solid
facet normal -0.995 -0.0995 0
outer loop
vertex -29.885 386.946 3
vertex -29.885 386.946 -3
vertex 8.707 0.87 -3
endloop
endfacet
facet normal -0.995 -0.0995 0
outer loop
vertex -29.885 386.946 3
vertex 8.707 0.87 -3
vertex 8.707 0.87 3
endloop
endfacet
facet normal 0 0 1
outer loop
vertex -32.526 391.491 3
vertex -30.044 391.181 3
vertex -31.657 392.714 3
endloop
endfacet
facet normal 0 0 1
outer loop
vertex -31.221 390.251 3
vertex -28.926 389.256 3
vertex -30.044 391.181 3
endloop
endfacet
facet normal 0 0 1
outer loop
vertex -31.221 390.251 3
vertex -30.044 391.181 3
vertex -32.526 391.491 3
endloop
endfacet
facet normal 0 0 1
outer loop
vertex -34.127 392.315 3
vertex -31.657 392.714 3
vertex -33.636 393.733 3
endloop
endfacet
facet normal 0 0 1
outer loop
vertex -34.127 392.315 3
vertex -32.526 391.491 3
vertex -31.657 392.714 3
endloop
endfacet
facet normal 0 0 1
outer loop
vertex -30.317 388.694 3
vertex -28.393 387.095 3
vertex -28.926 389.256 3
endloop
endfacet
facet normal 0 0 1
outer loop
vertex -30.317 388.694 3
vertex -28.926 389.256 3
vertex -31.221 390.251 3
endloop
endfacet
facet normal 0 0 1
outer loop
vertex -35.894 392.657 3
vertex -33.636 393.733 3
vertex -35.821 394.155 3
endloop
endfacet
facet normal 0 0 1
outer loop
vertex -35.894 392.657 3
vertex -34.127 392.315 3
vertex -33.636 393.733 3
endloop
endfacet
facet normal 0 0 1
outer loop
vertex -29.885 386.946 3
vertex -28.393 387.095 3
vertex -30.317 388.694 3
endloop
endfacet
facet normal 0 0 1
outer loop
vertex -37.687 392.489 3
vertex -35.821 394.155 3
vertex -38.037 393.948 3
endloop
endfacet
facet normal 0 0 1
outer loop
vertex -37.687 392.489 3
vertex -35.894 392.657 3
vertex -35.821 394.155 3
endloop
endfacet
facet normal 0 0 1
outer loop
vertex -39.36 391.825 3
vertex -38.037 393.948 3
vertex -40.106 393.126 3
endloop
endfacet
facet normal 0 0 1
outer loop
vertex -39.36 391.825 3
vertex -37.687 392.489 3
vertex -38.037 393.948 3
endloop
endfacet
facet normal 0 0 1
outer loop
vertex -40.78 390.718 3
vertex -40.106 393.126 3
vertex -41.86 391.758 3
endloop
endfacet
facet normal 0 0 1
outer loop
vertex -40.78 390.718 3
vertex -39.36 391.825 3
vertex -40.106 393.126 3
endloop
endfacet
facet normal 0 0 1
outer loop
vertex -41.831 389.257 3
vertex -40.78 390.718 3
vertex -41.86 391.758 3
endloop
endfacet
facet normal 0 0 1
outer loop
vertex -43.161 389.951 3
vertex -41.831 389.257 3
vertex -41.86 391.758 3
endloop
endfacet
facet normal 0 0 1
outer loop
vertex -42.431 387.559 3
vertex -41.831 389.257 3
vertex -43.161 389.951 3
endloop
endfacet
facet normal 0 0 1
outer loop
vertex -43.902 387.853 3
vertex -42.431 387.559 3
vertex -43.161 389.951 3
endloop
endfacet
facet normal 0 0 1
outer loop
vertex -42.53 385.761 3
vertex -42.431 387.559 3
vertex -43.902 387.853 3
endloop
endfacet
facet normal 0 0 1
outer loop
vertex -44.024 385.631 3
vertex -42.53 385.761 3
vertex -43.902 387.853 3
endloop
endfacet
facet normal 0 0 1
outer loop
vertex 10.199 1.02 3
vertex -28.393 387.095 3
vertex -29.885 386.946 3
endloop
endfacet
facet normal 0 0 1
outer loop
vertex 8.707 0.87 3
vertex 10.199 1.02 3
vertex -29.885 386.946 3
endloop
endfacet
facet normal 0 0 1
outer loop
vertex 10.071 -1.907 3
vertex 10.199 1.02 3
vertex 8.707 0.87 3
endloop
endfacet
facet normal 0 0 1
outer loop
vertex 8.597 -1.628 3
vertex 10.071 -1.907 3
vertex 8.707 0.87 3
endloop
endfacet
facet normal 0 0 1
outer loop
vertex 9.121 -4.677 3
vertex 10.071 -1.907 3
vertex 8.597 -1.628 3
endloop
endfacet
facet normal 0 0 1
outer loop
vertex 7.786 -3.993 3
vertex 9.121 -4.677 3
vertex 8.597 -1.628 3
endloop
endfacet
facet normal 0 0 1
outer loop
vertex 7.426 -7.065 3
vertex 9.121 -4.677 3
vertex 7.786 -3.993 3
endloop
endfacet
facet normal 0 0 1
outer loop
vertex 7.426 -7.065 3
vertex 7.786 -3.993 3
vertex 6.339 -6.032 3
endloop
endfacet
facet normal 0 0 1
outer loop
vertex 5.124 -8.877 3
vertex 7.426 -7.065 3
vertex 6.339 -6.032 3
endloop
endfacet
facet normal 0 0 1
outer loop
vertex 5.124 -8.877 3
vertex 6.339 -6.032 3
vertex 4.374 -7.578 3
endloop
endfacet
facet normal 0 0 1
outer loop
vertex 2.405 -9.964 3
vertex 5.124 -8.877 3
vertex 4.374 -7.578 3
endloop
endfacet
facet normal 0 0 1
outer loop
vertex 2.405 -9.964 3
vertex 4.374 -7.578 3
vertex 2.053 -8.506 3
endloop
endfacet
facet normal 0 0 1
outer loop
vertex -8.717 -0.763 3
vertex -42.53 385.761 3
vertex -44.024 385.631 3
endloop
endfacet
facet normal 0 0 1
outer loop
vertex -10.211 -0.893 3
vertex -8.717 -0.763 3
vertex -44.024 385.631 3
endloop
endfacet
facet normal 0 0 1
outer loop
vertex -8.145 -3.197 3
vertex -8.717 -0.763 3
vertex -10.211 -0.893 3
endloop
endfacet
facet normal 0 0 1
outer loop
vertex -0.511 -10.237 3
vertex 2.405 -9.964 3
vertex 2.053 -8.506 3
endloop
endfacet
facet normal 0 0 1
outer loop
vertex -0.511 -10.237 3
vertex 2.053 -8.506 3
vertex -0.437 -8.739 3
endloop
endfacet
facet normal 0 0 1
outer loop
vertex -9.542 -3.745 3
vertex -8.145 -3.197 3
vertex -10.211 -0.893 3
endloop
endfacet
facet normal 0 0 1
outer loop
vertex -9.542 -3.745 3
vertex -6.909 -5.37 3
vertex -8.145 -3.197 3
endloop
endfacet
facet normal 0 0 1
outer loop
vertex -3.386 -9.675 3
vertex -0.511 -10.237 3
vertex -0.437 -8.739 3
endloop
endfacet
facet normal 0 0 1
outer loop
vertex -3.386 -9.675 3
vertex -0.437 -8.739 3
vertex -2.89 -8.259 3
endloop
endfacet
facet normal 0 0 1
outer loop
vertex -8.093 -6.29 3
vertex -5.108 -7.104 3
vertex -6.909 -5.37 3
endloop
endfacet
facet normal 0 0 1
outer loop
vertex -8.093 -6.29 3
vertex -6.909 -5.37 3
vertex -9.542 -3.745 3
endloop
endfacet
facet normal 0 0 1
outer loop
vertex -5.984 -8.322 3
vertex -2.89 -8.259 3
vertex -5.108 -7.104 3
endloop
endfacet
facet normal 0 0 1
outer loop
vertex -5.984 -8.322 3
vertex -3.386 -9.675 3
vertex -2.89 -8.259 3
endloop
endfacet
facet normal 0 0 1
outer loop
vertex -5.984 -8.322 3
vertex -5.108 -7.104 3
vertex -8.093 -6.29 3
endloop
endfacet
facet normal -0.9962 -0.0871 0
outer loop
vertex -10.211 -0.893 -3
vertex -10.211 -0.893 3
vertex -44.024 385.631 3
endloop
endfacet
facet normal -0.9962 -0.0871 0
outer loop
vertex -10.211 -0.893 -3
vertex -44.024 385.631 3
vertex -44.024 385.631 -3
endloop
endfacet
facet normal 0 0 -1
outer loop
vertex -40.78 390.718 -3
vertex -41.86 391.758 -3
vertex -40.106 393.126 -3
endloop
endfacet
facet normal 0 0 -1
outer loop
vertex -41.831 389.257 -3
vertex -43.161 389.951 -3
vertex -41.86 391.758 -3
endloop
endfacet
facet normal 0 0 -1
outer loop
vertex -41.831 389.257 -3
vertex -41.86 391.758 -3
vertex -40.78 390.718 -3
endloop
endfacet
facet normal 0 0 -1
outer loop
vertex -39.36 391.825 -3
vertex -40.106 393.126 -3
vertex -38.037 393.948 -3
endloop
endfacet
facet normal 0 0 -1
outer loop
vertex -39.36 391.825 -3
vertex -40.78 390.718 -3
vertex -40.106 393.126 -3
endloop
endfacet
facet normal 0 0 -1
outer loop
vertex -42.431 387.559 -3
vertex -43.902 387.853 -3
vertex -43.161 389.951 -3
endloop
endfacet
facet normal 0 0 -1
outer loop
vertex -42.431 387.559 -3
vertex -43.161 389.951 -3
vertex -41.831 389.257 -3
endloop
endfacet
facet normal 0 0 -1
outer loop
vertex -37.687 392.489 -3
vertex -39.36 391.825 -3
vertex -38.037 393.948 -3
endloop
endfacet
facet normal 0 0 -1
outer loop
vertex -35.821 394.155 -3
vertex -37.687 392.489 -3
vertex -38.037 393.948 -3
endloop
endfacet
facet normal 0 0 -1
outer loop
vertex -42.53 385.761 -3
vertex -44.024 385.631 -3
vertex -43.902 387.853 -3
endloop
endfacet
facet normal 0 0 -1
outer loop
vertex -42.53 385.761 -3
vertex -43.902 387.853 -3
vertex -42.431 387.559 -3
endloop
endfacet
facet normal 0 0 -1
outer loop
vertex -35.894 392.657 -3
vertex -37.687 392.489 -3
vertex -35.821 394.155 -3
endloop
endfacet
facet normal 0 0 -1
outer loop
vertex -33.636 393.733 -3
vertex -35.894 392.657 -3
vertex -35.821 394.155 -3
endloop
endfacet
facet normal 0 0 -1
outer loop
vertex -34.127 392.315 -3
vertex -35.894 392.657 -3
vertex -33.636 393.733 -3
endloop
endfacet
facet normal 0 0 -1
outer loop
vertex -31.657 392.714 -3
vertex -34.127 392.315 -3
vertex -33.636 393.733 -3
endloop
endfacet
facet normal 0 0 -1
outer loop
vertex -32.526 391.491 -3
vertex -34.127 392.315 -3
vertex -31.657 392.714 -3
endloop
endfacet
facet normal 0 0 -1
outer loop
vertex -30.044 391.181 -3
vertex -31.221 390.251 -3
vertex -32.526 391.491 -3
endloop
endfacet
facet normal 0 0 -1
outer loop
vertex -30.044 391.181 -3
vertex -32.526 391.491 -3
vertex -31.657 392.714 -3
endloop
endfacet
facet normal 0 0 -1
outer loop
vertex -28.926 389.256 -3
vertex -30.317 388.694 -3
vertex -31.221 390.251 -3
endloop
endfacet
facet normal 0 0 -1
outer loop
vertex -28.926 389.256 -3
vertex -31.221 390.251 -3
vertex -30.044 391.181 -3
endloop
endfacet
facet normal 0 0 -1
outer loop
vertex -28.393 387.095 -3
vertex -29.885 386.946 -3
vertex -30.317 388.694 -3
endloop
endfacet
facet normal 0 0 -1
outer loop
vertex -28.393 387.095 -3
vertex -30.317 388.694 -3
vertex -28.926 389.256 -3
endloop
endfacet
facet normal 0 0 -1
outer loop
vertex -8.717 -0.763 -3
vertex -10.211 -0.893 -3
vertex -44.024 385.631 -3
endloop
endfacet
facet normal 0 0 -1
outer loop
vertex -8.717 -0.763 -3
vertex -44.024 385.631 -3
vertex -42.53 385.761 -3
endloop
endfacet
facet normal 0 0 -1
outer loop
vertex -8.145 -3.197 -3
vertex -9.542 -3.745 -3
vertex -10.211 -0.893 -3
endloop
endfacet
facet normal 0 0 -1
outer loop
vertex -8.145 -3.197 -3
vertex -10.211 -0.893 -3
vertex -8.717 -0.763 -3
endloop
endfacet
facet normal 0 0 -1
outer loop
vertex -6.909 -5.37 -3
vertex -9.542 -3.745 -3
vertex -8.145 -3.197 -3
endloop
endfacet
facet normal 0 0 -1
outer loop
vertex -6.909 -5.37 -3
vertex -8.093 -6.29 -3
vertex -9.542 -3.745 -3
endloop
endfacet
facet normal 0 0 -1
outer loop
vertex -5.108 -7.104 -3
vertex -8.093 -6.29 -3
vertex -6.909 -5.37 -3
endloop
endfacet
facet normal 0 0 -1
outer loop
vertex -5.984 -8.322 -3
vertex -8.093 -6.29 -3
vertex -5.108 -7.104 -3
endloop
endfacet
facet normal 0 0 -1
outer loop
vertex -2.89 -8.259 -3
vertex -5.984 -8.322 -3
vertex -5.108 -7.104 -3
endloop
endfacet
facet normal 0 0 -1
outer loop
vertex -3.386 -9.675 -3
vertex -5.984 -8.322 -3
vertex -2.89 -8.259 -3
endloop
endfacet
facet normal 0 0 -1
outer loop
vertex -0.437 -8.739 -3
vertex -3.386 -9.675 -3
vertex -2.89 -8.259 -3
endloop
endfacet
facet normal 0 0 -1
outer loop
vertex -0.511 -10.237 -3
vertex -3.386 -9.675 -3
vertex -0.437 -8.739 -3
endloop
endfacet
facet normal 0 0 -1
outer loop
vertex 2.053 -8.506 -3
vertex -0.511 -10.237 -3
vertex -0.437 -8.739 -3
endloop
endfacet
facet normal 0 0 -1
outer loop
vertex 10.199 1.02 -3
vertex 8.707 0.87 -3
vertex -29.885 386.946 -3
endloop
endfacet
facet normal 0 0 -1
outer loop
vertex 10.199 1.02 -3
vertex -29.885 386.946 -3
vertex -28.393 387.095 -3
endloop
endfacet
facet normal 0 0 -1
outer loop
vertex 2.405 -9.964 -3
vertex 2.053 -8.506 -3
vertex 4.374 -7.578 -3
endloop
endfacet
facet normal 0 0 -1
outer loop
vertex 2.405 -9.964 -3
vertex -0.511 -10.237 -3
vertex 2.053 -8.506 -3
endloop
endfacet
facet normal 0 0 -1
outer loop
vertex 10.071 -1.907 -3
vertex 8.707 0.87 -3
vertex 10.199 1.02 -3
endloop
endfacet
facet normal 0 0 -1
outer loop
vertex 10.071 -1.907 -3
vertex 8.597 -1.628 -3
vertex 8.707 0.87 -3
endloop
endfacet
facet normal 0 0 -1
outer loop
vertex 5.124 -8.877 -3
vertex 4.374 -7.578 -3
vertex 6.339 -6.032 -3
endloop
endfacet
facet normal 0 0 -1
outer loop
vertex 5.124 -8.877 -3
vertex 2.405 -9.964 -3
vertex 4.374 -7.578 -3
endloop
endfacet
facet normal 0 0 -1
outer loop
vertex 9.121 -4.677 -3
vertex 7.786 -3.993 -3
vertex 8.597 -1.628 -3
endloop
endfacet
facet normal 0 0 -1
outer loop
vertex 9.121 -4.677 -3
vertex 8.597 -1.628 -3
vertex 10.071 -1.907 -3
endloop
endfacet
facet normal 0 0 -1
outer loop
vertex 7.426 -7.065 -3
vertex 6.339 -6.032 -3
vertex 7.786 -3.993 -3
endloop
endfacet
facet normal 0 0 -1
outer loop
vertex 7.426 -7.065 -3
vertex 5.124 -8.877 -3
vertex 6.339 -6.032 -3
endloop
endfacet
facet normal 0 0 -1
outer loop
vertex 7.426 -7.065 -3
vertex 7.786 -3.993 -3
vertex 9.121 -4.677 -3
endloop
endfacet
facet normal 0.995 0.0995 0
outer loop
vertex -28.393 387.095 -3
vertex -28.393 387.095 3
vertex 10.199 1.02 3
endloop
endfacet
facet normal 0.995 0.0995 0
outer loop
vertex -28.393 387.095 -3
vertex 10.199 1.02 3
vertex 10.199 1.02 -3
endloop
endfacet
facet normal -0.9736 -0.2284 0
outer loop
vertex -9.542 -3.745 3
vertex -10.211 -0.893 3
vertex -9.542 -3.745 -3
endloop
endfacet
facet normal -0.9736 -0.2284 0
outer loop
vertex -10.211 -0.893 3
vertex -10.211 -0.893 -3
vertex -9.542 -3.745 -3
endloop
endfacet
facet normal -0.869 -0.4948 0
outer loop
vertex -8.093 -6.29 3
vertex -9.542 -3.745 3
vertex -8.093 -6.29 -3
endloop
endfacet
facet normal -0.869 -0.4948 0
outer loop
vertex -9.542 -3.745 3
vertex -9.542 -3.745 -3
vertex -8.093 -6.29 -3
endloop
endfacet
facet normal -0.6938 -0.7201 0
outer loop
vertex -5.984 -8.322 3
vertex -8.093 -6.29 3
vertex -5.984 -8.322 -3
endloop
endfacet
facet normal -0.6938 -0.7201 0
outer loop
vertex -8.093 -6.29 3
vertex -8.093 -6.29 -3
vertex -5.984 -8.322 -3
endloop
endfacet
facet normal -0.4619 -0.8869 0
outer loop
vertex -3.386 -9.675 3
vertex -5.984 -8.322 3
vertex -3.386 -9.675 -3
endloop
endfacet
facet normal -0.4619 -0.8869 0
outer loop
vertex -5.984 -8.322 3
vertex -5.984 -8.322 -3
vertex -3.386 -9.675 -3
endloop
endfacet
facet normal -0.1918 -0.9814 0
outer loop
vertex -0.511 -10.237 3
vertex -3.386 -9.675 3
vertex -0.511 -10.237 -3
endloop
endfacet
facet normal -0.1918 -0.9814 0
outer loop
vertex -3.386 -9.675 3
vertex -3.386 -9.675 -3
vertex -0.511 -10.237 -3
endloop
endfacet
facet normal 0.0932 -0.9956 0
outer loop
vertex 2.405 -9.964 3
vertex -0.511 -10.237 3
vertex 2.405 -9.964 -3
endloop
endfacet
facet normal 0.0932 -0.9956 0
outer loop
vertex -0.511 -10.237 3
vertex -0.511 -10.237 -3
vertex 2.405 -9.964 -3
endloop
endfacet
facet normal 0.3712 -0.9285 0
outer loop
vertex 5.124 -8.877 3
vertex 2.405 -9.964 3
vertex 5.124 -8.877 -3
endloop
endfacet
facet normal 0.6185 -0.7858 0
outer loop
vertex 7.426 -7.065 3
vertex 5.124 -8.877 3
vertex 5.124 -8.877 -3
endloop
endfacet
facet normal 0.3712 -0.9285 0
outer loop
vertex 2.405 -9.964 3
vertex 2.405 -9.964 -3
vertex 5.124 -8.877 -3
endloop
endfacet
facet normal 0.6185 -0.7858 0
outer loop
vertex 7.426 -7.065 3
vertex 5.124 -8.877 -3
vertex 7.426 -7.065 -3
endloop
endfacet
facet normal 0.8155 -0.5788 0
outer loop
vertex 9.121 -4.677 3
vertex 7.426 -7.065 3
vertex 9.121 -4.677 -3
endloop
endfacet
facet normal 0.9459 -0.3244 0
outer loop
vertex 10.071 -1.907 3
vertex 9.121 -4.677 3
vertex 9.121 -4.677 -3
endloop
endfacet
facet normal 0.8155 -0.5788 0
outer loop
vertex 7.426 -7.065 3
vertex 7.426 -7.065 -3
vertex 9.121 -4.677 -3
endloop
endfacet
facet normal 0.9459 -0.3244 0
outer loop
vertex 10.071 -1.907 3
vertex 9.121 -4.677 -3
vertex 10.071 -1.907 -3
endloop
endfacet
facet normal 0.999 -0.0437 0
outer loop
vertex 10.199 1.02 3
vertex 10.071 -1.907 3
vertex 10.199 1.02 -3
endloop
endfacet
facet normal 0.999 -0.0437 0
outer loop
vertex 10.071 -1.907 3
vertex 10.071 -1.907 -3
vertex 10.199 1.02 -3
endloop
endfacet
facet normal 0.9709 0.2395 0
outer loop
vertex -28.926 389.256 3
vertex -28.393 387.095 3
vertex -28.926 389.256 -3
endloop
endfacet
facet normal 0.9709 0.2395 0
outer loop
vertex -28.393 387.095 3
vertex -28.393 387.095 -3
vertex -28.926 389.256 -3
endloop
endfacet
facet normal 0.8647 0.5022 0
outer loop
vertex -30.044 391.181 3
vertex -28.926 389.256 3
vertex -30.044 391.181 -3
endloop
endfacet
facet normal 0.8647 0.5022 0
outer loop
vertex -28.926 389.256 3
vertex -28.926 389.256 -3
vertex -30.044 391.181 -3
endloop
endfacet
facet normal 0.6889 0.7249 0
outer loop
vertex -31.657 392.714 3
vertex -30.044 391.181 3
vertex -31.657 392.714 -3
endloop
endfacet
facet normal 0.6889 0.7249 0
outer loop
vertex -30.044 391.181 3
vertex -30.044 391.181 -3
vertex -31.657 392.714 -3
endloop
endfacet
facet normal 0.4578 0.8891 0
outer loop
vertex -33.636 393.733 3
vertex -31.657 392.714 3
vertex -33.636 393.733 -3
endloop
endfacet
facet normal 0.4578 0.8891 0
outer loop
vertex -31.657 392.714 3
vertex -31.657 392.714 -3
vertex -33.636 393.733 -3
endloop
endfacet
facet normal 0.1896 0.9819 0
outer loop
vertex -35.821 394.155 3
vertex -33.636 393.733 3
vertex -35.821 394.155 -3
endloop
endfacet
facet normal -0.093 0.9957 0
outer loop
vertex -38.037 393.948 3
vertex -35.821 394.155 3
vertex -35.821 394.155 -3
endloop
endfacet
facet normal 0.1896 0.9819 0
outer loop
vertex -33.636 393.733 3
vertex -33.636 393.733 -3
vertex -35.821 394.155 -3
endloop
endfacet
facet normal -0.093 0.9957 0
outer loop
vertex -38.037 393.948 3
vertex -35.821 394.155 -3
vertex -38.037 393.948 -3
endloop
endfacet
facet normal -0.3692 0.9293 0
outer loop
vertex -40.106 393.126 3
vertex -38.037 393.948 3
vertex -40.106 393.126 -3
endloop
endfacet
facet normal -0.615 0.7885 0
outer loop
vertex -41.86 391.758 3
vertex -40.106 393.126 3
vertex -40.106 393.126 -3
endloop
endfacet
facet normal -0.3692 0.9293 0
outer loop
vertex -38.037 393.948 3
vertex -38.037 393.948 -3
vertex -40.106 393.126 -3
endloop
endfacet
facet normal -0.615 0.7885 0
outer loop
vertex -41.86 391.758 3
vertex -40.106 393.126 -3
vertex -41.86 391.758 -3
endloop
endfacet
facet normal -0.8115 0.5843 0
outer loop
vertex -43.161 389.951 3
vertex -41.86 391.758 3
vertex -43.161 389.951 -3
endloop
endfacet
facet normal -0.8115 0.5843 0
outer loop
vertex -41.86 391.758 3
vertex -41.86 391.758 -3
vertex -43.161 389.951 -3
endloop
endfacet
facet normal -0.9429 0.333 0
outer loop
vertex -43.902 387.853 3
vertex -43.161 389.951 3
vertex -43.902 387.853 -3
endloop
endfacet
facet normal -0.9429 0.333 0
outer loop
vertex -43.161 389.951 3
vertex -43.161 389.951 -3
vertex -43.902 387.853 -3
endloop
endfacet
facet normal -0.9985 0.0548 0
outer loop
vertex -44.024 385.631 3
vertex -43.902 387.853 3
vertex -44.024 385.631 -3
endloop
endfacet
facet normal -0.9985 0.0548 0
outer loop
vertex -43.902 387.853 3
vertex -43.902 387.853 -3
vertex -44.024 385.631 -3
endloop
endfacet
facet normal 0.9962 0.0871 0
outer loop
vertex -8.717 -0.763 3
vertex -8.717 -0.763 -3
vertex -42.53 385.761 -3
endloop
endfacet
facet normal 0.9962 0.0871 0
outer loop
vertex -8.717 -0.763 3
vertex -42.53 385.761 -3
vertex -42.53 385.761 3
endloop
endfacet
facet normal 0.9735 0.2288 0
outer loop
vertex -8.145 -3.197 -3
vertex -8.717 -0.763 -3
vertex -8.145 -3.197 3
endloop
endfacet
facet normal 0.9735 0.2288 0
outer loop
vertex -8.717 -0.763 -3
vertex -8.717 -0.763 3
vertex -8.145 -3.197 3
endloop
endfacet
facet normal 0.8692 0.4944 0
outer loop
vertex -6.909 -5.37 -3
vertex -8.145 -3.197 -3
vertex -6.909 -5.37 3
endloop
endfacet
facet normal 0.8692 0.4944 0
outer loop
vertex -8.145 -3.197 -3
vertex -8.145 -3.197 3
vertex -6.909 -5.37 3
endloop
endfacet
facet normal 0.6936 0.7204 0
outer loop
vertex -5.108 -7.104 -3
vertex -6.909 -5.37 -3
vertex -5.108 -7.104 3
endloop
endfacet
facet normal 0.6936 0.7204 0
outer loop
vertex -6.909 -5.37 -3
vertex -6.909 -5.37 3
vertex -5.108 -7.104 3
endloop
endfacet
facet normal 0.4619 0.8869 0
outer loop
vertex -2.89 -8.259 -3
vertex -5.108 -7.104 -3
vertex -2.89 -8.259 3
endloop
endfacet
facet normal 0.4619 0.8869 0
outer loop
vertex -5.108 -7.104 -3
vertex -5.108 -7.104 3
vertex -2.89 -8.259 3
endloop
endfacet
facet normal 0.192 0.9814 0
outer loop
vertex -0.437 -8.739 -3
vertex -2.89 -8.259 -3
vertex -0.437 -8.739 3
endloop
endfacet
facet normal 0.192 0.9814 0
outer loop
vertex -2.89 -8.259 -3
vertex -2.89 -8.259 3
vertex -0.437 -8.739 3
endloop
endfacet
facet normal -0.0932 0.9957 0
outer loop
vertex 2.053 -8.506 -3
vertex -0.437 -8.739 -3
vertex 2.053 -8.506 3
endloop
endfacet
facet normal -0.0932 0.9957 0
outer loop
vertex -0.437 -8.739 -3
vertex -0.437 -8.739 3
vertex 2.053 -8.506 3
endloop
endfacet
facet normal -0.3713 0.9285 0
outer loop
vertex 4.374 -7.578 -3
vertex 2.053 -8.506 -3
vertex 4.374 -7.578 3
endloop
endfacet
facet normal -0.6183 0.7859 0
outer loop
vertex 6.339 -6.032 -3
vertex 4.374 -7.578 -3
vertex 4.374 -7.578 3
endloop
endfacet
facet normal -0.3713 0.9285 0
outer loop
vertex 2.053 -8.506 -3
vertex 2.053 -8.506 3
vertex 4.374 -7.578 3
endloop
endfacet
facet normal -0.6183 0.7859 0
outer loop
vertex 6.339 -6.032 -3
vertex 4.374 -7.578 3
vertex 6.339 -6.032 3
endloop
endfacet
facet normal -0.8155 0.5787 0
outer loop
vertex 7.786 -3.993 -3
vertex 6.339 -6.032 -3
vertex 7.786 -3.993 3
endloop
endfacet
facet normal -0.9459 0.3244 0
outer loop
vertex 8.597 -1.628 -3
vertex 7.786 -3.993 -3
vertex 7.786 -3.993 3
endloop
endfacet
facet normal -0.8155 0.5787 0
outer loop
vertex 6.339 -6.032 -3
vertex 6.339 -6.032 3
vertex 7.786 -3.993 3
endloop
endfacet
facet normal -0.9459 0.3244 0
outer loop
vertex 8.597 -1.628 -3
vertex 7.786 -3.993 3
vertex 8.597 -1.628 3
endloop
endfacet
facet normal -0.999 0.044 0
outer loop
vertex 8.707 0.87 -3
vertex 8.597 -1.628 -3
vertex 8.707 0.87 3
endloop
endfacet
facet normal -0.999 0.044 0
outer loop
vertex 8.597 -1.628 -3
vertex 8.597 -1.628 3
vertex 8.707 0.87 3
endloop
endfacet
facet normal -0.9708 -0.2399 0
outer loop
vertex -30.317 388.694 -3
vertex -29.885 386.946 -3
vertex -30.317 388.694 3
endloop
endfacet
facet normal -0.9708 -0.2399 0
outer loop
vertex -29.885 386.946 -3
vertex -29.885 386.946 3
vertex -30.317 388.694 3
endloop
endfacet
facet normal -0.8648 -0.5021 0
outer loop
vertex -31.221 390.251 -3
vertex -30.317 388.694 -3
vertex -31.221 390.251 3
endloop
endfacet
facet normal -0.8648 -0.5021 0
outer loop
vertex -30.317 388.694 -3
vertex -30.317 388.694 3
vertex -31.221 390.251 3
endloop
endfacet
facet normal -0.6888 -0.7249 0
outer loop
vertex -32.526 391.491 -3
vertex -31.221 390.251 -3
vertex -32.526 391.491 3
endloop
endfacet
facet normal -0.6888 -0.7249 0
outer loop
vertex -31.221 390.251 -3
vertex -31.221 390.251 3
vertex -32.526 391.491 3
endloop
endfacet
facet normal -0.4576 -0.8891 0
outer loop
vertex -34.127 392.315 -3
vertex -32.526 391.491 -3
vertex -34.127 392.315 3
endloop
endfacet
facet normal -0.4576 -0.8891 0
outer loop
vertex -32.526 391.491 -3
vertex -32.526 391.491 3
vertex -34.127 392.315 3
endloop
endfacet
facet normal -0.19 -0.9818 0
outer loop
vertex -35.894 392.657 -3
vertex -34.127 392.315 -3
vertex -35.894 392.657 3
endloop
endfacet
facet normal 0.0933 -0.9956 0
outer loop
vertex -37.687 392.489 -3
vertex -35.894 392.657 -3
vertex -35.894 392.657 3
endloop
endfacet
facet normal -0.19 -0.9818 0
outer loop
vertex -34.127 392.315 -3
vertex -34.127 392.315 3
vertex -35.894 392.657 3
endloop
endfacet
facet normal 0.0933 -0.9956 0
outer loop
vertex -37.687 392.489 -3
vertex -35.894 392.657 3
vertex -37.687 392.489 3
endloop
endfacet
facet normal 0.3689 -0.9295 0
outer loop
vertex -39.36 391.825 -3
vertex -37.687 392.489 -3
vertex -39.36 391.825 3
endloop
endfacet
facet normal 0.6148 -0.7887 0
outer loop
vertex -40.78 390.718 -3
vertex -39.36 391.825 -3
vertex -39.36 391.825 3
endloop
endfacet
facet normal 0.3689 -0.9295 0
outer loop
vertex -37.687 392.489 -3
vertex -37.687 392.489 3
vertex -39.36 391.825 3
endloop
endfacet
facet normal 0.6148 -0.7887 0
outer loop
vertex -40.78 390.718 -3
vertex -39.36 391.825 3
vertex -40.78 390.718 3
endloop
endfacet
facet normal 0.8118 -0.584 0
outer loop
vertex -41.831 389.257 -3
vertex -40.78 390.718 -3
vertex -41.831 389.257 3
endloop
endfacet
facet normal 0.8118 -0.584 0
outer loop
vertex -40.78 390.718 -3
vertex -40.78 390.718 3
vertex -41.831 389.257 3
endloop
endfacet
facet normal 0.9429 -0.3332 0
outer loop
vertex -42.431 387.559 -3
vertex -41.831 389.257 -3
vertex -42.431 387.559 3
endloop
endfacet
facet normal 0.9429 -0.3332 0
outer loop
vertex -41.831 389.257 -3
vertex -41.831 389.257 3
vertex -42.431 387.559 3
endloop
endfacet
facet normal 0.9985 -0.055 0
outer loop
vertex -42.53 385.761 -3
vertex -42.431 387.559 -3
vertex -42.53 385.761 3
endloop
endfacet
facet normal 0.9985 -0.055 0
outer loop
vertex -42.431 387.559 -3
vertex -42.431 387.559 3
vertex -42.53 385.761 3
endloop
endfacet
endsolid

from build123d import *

# Parameters (mm, degrees)
SKETCH2_W = 1.5
SKETCH2_H = 6


with BuildPart() as part:
    # Sweep1: sweep along a path in Sketch1
    with BuildLine(Plane.XY) as sweep1_path:
        Line((-42.529793069, 385.761298089), (-8.716710208, -0.762537307))
        ThreePointArc((-8.716710208, -0.762537307), (0.816439483, -8.711826822), (8.706610119, 0.870310423))
        Line((8.706610119, 0.870310423), (-29.885440603, 386.946279013))
        ThreePointArc((-29.885440603, 386.946279013), (-36.796453743, 392.636979485), (-42.529793069, 385.761298089))
    # Sketch2 → Sweep1 (sweep)
    with BuildSketch(Plane(origin=(-25.623251639, 192.499380391, 0), x_dir=(-0.996195452, -0.087147121, 0), z_dir=(0.087147121, -0.996195452, 0))):
        with Locations((0.75, 0)):
            Rectangle(SKETCH2_W, SKETCH2_H)
    sweep(path=sweep1_path.line)


solid = part.part
